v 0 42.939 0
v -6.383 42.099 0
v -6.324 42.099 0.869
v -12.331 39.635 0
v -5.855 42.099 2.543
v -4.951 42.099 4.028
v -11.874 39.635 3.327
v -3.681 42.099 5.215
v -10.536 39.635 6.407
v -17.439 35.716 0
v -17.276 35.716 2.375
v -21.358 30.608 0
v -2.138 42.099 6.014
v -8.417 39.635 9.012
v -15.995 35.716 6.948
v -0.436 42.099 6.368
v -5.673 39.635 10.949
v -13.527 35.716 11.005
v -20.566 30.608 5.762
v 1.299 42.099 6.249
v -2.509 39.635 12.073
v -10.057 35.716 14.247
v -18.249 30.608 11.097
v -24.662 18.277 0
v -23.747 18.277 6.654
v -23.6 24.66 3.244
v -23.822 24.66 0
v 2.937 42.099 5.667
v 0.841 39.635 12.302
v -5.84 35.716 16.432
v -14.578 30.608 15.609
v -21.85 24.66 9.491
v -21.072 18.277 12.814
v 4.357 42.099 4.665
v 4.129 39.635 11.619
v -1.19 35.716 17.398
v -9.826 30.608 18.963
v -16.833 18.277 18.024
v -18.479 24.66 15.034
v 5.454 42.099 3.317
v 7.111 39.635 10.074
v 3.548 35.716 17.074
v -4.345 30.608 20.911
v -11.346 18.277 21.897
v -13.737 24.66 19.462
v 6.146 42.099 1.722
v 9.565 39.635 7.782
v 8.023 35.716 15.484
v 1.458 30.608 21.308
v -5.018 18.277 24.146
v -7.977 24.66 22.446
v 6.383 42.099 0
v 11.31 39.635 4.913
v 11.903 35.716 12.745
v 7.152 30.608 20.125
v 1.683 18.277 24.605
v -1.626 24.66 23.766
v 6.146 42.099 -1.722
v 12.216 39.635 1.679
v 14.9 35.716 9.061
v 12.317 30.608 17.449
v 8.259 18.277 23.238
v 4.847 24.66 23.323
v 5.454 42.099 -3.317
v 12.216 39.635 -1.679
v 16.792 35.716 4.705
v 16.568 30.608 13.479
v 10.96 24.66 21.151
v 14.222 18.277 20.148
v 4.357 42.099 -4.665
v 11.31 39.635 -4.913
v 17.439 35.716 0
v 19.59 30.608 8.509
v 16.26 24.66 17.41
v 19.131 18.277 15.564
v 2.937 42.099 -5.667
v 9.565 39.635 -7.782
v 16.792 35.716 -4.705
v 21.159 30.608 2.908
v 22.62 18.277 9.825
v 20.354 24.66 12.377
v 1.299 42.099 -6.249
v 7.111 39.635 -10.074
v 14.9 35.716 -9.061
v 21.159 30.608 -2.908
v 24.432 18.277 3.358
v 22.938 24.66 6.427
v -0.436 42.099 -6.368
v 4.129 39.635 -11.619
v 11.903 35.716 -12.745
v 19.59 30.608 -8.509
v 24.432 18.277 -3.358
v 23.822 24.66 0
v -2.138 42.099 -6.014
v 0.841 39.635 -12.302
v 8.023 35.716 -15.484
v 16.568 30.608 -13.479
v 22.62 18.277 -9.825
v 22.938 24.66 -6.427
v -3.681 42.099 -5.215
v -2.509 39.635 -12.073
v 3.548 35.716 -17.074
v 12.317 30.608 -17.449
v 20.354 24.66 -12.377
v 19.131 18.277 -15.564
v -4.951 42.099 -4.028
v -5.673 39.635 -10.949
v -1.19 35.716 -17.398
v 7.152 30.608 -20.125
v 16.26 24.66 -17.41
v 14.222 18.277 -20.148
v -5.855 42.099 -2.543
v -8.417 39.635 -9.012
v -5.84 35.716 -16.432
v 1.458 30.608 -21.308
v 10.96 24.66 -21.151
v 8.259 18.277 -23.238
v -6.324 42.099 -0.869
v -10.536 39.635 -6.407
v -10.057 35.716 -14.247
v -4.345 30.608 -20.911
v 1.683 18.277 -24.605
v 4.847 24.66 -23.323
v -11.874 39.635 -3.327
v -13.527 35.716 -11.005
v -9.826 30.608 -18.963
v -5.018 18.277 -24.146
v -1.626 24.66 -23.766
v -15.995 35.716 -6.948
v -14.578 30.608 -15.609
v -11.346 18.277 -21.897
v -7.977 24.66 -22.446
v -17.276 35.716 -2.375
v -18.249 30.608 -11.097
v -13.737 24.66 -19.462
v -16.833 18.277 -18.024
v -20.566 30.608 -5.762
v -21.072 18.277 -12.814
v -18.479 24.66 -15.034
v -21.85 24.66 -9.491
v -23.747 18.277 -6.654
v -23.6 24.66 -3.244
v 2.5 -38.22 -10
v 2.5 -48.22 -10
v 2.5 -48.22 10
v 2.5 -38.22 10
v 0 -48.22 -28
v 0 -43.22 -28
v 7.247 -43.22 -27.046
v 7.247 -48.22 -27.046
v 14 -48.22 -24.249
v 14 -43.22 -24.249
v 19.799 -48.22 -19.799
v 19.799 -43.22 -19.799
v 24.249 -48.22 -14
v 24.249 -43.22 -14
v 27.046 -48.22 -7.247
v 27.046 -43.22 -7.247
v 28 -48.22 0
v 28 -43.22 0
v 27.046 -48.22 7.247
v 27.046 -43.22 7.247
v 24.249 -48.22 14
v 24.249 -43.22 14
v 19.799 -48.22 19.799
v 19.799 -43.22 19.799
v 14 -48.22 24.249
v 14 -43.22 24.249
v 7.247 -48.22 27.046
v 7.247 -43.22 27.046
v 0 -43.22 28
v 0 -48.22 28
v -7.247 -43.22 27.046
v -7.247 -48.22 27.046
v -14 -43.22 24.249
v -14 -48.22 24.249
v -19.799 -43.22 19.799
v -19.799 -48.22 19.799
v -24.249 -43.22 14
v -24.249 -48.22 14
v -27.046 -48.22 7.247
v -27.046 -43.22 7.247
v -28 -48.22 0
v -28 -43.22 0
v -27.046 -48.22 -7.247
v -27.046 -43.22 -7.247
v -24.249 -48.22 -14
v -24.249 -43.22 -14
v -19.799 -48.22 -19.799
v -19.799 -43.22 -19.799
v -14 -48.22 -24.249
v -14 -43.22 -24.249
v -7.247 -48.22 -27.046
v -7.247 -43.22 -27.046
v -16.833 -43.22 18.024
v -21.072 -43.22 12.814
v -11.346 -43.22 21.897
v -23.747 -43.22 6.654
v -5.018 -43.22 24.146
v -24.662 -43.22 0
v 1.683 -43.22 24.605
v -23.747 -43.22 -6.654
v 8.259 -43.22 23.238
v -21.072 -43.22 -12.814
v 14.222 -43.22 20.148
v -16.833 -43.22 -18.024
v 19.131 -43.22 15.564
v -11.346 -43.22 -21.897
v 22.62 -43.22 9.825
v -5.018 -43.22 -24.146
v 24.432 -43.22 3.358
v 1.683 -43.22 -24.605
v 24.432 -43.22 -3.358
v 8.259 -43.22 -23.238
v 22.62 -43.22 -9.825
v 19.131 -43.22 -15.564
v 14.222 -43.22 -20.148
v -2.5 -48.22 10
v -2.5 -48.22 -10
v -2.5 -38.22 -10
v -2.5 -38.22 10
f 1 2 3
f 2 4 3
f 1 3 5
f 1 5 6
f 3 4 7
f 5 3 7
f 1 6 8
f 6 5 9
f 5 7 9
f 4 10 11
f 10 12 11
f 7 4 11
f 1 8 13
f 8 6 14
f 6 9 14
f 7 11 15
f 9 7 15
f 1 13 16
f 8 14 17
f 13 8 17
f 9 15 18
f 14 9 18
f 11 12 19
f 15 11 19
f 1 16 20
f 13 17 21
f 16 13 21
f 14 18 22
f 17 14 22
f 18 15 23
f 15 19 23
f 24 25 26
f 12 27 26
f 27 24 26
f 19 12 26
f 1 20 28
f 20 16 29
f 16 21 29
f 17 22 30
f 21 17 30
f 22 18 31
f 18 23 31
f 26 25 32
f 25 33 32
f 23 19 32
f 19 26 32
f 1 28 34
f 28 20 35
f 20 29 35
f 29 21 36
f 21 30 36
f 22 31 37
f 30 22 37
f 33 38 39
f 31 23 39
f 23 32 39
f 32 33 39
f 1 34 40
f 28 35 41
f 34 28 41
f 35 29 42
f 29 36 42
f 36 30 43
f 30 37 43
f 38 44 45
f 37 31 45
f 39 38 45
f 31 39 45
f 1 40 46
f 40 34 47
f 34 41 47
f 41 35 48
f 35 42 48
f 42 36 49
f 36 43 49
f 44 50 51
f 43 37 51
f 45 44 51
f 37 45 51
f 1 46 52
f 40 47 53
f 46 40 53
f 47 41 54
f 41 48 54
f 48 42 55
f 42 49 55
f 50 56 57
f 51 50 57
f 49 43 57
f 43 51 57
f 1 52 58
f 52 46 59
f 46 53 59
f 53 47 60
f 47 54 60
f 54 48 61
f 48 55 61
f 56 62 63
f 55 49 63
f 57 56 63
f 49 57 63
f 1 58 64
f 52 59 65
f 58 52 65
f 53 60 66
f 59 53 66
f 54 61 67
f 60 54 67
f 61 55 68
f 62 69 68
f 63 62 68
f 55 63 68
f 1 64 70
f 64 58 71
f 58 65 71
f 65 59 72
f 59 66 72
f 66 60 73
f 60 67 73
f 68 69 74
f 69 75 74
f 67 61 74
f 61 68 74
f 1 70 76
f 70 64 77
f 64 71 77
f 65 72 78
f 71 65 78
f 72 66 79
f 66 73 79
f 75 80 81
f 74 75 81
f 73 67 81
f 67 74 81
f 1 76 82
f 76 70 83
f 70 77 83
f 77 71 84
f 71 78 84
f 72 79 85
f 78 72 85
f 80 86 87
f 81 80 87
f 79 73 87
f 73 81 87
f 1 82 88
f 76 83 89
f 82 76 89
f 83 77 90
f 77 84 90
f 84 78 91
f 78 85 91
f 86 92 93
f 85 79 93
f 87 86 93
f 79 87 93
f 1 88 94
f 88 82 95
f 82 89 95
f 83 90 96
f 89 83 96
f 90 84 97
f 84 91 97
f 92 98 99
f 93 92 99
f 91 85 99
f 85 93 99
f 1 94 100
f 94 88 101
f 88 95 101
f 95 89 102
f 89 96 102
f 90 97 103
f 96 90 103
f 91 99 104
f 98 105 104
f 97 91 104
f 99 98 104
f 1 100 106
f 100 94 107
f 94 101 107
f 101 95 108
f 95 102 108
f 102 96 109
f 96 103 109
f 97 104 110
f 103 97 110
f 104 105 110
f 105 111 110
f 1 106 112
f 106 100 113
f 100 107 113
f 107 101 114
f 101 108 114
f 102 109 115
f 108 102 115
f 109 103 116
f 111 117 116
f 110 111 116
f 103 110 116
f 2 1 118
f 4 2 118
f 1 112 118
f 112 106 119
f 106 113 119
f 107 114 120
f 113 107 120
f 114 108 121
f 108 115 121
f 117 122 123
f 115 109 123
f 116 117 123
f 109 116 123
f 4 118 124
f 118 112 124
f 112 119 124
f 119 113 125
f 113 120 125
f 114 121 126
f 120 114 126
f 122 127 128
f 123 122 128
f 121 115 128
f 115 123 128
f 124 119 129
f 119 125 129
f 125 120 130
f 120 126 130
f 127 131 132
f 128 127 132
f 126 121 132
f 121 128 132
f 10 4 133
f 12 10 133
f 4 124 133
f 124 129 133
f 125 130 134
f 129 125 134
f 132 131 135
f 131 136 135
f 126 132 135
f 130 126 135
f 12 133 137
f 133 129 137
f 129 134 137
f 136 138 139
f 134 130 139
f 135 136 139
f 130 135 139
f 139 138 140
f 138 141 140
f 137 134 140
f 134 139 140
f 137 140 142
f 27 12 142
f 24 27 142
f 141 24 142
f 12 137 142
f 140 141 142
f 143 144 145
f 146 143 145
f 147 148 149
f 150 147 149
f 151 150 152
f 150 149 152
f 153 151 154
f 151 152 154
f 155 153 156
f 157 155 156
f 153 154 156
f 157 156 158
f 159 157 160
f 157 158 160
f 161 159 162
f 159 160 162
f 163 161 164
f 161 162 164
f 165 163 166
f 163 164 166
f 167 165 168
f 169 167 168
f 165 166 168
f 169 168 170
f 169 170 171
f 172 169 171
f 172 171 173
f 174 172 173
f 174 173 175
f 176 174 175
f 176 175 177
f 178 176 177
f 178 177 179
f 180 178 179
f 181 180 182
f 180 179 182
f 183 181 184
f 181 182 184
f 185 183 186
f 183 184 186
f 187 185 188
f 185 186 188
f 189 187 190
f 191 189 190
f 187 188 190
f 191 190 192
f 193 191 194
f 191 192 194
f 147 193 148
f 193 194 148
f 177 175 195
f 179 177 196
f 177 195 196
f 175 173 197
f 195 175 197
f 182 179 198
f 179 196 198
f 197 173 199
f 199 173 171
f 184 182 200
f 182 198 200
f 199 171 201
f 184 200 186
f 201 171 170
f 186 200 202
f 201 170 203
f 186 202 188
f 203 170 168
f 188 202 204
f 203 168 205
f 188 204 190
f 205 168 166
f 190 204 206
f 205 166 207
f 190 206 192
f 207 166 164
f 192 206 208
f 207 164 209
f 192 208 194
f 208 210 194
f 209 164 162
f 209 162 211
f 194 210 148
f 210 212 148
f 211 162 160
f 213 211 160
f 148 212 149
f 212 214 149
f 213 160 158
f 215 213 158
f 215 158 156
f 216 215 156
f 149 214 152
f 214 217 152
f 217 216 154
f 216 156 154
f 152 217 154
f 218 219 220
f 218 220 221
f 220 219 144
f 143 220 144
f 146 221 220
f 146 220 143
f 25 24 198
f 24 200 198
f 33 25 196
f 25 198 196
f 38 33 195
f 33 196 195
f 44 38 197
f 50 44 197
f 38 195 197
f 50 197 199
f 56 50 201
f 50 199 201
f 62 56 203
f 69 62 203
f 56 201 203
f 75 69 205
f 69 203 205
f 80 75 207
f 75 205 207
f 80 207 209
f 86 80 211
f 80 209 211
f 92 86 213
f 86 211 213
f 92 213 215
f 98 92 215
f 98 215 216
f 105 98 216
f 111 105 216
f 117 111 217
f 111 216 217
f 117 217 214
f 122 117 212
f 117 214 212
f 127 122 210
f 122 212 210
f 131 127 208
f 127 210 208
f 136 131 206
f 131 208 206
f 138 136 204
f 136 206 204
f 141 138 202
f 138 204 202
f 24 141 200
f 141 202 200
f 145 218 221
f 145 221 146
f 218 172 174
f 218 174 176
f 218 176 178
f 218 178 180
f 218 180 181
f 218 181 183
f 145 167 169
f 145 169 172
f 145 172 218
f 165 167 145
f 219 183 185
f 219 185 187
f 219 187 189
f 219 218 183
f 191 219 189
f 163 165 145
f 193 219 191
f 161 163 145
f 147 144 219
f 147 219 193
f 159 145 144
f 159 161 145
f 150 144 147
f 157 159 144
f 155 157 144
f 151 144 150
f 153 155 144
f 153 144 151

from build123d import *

# Parameters (mm, degrees)
SKETCH2_R           = 28
BOSS_EXTRUDE1_DEPTH = 5
SKETCH3_W           = 5
SKETCH3_H           = 20
CUT_EXTRUDE1_DEPTH  = 10


with BuildPart() as part:
    # Sketch1 → Revolve1 (revolve)
    with BuildSketch(Plane.XY):
        with BuildLine():
            Line((-24.662024669, 18.27739706), (-24.662024669, -43.219960911))
            Line((-24.662024669, -43.219960911), (0, -43.219960911))
            Line((0, -43.219960911), (0, 42.939421729))
            ThreePointArc((0, 42.939421729), (-17.438684882, 35.716081941), (-24.662024669, 18.27739706))
        make_face()
    revolve(axis=Axis((0, -43.219960911, 0), (0, 1, 0)))

    # Sketch2 → Boss-Extrude1 (add)
    with BuildSketch(Plane.XZ.offset(43.219960911)):
        with Locations(Location((0, 0, 0), (0, 0, 270))):
            Circle(SKETCH2_R)
    extrude(amount=BOSS_EXTRUDE1_DEPTH)

    # Sketch3 → Cut-Extrude1 (cut)
    with BuildSketch(Plane.XZ.offset(48.219960911)):
        Rectangle(SKETCH3_W, SKETCH3_H)
    extrude(amount=-CUT_EXTRUDE1_DEPTH, mode=Mode.SUBTRACT)


solid = part.part
